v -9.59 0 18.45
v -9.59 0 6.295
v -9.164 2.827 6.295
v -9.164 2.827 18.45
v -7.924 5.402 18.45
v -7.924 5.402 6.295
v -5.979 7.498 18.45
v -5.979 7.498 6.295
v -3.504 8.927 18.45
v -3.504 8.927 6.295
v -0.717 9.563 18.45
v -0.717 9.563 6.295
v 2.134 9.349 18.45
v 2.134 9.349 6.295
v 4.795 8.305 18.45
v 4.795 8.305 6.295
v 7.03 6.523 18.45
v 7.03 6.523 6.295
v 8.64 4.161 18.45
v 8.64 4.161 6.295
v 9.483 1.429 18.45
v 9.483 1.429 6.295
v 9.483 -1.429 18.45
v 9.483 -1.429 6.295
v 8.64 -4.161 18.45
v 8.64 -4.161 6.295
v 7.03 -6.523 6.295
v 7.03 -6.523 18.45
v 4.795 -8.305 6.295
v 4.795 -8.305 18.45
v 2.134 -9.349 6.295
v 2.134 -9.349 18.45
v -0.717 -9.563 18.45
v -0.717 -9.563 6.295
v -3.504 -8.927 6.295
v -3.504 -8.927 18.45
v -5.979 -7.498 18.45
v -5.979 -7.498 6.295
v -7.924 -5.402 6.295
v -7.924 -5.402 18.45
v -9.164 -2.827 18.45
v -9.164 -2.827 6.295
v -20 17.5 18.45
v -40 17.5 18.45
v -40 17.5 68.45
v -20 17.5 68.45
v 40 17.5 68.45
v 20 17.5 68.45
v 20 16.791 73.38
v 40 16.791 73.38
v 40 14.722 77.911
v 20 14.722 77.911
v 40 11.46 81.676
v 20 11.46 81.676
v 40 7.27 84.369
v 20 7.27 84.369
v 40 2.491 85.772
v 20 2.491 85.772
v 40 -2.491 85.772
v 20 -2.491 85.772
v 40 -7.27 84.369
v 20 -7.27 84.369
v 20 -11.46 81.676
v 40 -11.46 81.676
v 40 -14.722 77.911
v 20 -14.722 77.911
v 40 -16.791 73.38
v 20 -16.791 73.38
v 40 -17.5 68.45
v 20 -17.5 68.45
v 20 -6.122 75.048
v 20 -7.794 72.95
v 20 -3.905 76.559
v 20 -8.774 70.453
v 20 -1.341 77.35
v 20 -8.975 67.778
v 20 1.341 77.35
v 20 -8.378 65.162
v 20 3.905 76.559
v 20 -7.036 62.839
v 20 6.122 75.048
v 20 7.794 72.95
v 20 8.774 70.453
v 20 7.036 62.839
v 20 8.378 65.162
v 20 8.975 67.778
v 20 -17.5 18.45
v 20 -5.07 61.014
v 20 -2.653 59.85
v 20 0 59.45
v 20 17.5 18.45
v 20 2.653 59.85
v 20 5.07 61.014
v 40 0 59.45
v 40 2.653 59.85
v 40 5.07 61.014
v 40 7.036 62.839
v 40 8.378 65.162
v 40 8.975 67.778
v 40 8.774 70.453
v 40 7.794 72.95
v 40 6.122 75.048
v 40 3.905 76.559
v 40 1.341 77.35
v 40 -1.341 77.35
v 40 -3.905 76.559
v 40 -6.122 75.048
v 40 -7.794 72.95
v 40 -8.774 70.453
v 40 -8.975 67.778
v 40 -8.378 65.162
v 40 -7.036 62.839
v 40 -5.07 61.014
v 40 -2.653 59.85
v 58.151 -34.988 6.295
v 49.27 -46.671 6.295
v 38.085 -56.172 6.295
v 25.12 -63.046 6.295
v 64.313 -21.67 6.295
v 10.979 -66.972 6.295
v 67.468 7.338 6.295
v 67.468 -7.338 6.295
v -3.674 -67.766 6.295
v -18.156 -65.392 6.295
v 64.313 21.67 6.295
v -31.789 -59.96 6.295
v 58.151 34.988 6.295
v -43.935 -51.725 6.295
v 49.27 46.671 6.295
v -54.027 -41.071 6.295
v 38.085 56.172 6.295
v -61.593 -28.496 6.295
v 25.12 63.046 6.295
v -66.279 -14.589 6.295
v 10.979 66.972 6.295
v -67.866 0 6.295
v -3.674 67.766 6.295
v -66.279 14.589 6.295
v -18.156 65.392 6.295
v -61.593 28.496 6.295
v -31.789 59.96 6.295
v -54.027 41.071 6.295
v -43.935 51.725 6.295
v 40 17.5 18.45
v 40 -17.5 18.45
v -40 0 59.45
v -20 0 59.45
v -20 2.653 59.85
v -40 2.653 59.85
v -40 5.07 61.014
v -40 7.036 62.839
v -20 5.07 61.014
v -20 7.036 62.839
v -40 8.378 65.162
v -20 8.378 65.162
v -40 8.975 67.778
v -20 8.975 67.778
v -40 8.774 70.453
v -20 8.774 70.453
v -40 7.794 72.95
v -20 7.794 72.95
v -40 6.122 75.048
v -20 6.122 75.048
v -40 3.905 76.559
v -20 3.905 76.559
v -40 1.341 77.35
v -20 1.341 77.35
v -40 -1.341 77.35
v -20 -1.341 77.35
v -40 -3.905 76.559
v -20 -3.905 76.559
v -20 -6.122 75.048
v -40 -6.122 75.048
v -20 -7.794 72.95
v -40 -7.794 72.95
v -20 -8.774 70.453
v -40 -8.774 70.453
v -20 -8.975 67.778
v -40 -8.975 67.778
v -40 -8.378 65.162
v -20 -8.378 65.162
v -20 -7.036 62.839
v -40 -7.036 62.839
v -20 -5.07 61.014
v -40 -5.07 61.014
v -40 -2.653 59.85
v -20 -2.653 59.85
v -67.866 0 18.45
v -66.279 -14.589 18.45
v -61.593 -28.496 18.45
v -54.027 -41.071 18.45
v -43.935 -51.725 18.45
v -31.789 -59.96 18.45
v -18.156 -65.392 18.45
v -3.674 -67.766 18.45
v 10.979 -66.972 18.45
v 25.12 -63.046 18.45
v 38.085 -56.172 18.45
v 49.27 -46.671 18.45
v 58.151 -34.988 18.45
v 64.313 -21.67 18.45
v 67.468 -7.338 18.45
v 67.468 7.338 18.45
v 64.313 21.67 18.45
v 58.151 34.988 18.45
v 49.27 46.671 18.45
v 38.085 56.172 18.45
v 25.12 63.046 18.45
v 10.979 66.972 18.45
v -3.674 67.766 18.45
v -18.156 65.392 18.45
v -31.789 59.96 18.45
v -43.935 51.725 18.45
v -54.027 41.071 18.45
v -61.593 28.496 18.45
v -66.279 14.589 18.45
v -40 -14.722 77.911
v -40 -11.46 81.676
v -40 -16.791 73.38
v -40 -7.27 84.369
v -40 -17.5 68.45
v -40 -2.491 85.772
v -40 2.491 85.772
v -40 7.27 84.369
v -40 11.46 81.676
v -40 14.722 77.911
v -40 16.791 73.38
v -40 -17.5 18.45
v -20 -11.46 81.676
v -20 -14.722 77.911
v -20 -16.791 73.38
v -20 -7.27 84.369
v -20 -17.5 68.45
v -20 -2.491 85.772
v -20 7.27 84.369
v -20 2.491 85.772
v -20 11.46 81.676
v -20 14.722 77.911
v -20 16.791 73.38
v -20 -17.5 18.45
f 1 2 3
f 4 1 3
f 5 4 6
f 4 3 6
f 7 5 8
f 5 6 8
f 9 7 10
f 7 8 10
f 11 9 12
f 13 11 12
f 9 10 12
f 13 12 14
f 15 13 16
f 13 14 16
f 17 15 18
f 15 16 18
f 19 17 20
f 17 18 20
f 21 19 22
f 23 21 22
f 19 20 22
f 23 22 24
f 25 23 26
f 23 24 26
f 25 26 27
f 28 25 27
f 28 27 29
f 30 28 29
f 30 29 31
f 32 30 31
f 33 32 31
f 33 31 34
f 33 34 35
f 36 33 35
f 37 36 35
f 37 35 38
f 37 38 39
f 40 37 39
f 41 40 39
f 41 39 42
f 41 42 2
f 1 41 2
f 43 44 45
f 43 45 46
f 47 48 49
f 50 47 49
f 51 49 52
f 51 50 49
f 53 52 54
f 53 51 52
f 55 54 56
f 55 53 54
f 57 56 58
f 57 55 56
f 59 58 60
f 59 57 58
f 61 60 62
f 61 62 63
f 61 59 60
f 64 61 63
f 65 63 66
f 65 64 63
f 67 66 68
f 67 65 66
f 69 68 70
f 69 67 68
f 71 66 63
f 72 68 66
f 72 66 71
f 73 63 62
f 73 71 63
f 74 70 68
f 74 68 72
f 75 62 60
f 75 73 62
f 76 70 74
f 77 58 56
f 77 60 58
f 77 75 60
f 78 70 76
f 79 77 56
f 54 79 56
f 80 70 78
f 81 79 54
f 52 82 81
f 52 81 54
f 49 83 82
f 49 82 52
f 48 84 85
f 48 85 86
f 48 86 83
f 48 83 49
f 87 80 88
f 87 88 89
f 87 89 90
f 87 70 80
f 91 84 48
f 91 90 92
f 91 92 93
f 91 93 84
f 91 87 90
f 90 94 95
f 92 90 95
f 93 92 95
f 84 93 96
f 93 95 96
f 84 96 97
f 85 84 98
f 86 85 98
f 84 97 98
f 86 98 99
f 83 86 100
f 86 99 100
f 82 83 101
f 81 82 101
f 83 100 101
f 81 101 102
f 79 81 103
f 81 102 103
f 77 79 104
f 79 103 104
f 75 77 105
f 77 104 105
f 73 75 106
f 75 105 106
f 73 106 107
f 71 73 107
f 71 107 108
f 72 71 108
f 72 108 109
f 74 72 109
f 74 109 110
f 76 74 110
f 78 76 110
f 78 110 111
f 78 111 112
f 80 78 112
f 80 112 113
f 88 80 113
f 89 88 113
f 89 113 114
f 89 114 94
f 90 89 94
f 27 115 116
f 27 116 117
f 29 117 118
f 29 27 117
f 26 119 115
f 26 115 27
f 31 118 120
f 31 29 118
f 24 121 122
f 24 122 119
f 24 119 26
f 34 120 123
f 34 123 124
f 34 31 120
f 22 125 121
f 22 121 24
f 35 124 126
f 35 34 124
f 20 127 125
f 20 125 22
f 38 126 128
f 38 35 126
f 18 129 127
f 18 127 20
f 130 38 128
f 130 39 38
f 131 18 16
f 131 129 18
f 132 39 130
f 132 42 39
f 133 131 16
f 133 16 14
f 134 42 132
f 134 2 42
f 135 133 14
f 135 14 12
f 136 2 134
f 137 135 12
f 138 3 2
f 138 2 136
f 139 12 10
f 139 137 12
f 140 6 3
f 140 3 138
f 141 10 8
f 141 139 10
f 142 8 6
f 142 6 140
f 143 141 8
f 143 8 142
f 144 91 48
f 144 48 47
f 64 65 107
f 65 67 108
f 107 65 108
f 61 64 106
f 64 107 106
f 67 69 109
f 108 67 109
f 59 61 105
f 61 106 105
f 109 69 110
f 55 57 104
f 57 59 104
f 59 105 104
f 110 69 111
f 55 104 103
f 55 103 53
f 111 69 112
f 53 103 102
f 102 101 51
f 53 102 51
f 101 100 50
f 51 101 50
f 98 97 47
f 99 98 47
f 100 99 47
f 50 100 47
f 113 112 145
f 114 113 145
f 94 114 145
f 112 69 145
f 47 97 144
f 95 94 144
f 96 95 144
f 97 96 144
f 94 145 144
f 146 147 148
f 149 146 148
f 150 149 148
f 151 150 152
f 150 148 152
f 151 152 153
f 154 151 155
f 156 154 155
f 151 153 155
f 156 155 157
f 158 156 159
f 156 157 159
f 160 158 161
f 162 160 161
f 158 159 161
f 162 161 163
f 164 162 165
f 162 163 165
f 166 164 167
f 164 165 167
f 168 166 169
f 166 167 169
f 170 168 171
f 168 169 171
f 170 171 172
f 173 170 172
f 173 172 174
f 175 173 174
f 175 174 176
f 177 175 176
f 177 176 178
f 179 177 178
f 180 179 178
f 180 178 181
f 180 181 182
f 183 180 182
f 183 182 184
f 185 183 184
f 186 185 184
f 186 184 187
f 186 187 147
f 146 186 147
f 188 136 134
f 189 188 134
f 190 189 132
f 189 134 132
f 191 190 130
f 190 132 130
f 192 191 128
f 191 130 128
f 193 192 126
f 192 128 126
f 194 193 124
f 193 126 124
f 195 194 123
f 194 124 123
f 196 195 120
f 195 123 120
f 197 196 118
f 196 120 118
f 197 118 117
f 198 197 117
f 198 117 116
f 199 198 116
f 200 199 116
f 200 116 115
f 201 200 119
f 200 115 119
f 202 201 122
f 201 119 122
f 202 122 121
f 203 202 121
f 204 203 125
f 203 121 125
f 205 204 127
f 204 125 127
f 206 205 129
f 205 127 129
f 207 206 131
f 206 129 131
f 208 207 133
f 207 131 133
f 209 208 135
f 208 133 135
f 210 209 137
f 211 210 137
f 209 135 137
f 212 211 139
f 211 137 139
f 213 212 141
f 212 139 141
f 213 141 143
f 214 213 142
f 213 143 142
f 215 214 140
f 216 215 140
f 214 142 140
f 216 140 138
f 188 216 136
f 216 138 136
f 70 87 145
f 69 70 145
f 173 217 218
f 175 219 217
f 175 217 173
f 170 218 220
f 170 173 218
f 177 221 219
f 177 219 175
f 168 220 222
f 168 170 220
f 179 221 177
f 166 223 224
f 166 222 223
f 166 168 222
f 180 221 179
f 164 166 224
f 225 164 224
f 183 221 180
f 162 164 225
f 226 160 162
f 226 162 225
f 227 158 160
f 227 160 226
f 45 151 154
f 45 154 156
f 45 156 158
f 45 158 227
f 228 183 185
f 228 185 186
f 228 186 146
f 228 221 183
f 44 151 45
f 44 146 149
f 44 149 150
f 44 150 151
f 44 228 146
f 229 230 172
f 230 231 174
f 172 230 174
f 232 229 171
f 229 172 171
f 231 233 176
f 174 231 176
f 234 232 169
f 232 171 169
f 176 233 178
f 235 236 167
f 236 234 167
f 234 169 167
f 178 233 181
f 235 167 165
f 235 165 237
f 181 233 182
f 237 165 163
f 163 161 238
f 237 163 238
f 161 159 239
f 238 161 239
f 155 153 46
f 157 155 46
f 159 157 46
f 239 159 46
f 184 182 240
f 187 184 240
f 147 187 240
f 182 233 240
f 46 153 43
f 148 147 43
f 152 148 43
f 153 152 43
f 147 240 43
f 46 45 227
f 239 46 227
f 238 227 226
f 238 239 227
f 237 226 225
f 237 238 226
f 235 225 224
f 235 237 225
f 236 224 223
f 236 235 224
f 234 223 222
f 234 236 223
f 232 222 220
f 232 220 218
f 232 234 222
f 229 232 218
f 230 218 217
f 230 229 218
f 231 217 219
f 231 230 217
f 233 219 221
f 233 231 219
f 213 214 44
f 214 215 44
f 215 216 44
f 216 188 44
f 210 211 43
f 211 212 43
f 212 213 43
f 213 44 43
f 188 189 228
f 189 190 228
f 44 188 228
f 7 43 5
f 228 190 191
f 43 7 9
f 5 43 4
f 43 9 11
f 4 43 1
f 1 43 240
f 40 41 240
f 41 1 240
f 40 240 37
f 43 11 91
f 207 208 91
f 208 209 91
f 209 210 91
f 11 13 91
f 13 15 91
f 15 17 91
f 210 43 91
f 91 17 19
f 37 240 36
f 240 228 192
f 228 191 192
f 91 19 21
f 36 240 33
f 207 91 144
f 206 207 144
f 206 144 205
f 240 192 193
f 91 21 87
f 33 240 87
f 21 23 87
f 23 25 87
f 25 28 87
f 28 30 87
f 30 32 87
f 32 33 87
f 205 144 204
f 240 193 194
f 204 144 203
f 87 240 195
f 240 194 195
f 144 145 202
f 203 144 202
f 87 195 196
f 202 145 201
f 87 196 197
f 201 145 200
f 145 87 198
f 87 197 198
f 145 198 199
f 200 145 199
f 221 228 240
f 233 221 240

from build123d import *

# Parameters (mm, degrees)
SKETCH5_R            = 9.589935832
CUT_EXTRUDE1_DEPTH   = 40
BOSS_EXTRUDE8_DEPTH  = 60
CIRPATTERN8_COUNT    = 24
SKETCH18_W           = 20
SKETCH18_H           = 35
BOSS_EXTRUDE9_DEPTH  = 50
SKETCH19_R           = 17.5
BOSS_EXTRUDE10_DEPTH = 20
SKETCH20_R           = 17.5
BOSS_EXTRUDE11_DEPTH = 20
SKETCH22_R           = 70
CUT_EXTRUDE3_DEPTH   = 65
SKETCH23_R           = 9
CUT_EXTRUDE4_DEPTH   = 90


with BuildPart() as part:
    # Sketch4 → Revolve1 (revolve)
    with BuildSketch(Plane(origin=(0, 0, 0), x_dir=(1, 0, 0), z_dir=(0, 1, 0))):
        Polygon((0, 0), (0, -18.450154162), (67.865602024, -18.450154162), (67.865602024, 58.705035971), (49.02838169, 58.705035971), (49.02838169, 0), align=None)
    revolve(axis=Axis((0, 0, -85.541623844), (0, 0, 1)))

    # Sketch5 → Cut-Extrude1 (cut)
    with BuildSketch(Plane(origin=(0, 0, 0), x_dir=(-1, 0, 0), z_dir=(0, 0, -1))):
        Circle(SKETCH5_R)
    extrude(amount=-CUT_EXTRUDE1_DEPTH, mode=Mode.SUBTRACT)

    # Sketch18 → Boss-Extrude9 (add)
    with BuildSketch(Plane.XY.offset(18.450154162)):
        with Locations((-30, 0)):
            Rectangle(SKETCH18_W, SKETCH18_H)
        with Locations((30, 0)):
            Rectangle(SKETCH18_W, SKETCH18_H)
    extrude(amount=BOSS_EXTRUDE9_DEPTH)

    # Sketch19 → Boss-Extrude10 (add)
    with BuildSketch(Plane(origin=(-20, 0, 0), x_dir=(0, 0, -1), z_dir=(1, 0, 0))):
        with Locations((-68.450154162, 0)):
            Circle(SKETCH19_R)
    extrude(amount=-BOSS_EXTRUDE10_DEPTH)

    # Sketch20 → Boss-Extrude11 (add)
    with BuildSketch(Plane(origin=(40, 0, 0), x_dir=(0, 0, -1), z_dir=(1, 0, 0))):
        with Locations((-68.450154162, 0)):
            Circle(SKETCH20_R)
    extrude(amount=-BOSS_EXTRUDE11_DEPTH)


with BuildPart() as body_2:
    # Sketch6 → Boss-Extrude8 (new body)
    with BuildSketch(Plane(origin=(0, 0, -58.705035971), x_dir=(-1, 0, 0), z_dir=(0, 0, -1))):
        Polygon((-8.362087214, 48.310016649), (-5.897089184, 44.631705328), (-3.61276171, 45.181148209), (-2.68200751, 48.954969583), align=None)
    extrude(amount=-BOSS_EXTRUDE8_DEPTH)


with BuildPart() as cirpattern8_1:
    # CirPattern8: pattern copy
    add(body_2.part.rotate(Axis((0, 0, 18.450154162), (0, 0, -1)), 1 * 360 / CIRPATTERN8_COUNT))


with BuildPart() as cirpattern8_2:
    # CirPattern8: pattern copy
    add(body_2.part.rotate(Axis((0, 0, 18.450154162), (0, 0, -1)), 2 * 360 / CIRPATTERN8_COUNT))


with BuildPart() as cirpattern8_3:
    # CirPattern8: pattern copy
    add(body_2.part.rotate(Axis((0, 0, 18.450154162), (0, 0, -1)), 3 * 360 / CIRPATTERN8_COUNT))


with BuildPart() as cirpattern8_4:
    # CirPattern8: pattern copy
    add(body_2.part.rotate(Axis((0, 0, 18.450154162), (0, 0, -1)), 4 * 360 / CIRPATTERN8_COUNT))


with BuildPart() as cirpattern8_5:
    # CirPattern8: pattern copy
    add(body_2.part.rotate(Axis((0, 0, 18.450154162), (0, 0, -1)), 5 * 360 / CIRPATTERN8_COUNT))


with BuildPart() as cirpattern8_6:
    # CirPattern8: pattern copy
    add(body_2.part.rotate(Axis((0, 0, 18.450154162), (0, 0, -1)), 6 * 360 / CIRPATTERN8_COUNT))


with BuildPart() as cirpattern8_7:
    # CirPattern8: pattern copy
    add(body_2.part.rotate(Axis((0, 0, 18.450154162), (0, 0, -1)), 7 * 360 / CIRPATTERN8_COUNT))


with BuildPart() as cirpattern8_8:
    # CirPattern8: pattern copy
    add(body_2.part.rotate(Axis((0, 0, 18.450154162), (0, 0, -1)), 8 * 360 / CIRPATTERN8_COUNT))


with BuildPart() as cirpattern8_9:
    # CirPattern8: pattern copy
    add(body_2.part.rotate(Axis((0, 0, 18.450154162), (0, 0, -1)), 9 * 360 / CIRPATTERN8_COUNT))


with BuildPart() as cirpattern8_10:
    # CirPattern8: pattern copy
    add(body_2.part.rotate(Axis((0, 0, 18.450154162), (0, 0, -1)), 10 * 360 / CIRPATTERN8_COUNT))


with BuildPart() as cirpattern8_11:
    # CirPattern8: pattern copy
    add(body_2.part.rotate(Axis((0, 0, 18.450154162), (0, 0, -1)), 11 * 360 / CIRPATTERN8_COUNT))


with BuildPart() as cirpattern8_12:
    # CirPattern8: pattern copy
    add(body_2.part.rotate(Axis((0, 0, 18.450154162), (0, 0, -1)), 12 * 360 / CIRPATTERN8_COUNT))


with BuildPart() as cirpattern8_13:
    # CirPattern8: pattern copy
    add(body_2.part.rotate(Axis((0, 0, 18.450154162), (0, 0, -1)), 13 * 360 / CIRPATTERN8_COUNT))


with BuildPart() as cirpattern8_14:
    # CirPattern8: pattern copy
    add(body_2.part.rotate(Axis((0, 0, 18.450154162), (0, 0, -1)), 14 * 360 / CIRPATTERN8_COUNT))


with BuildPart() as cirpattern8_15:
    # CirPattern8: pattern copy
    add(body_2.part.rotate(Axis((0, 0, 18.450154162), (0, 0, -1)), 15 * 360 / CIRPATTERN8_COUNT))


with BuildPart() as cirpattern8_16:
    # CirPattern8: pattern copy
    add(body_2.part.rotate(Axis((0, 0, 18.450154162), (0, 0, -1)), 16 * 360 / CIRPATTERN8_COUNT))


with BuildPart() as cirpattern8_17:
    # CirPattern8: pattern copy
    add(body_2.part.rotate(Axis((0, 0, 18.450154162), (0, 0, -1)), 17 * 360 / CIRPATTERN8_COUNT))


with BuildPart() as cirpattern8_18:
    # CirPattern8: pattern copy
    add(body_2.part.rotate(Axis((0, 0, 18.450154162), (0, 0, -1)), 18 * 360 / CIRPATTERN8_COUNT))


with BuildPart() as cirpattern8_19:
    # CirPattern8: pattern copy
    add(body_2.part.rotate(Axis((0, 0, 18.450154162), (0, 0, -1)), 19 * 360 / CIRPATTERN8_COUNT))


with BuildPart() as cirpattern8_20:
    # CirPattern8: pattern copy
    add(body_2.part.rotate(Axis((0, 0, 18.450154162), (0, 0, -1)), 20 * 360 / CIRPATTERN8_COUNT))


with BuildPart() as cirpattern8_21:
    # CirPattern8: pattern copy
    add(body_2.part.rotate(Axis((0, 0, 18.450154162), (0, 0, -1)), 21 * 360 / CIRPATTERN8_COUNT))


with BuildPart() as cirpattern8_22:
    # CirPattern8: pattern copy
    add(body_2.part.rotate(Axis((0, 0, 18.450154162), (0, 0, -1)), 22 * 360 / CIRPATTERN8_COUNT))


with BuildPart() as cirpattern8_23:
    # CirPattern8: pattern copy
    add(body_2.part.rotate(Axis((0, 0, 18.450154162), (0, 0, -1)), 23 * 360 / CIRPATTERN8_COUNT))


with BuildPart() as cut_extrude3_tool:
    # Sketch22 → Cut-Extrude3 (new body)
    with BuildSketch(Plane(origin=(0, 0, -58.705035971), x_dir=(-1, 0, 0), z_dir=(0, 0, -1))):
        Circle(SKETCH22_R)
    extrude(amount=-CUT_EXTRUDE3_DEPTH)


with BuildPart() as part_1:
    add(part.part)

    # Cut-Extrude3: cut by cut_extrude3_tool
    add(cut_extrude3_tool.part, mode=Mode.SUBTRACT)

    # Sketch23 → Cut-Extrude4 (cut)
    with BuildSketch(Plane(origin=(40, 0, 0), x_dir=(0, 0, -1), z_dir=(1, 0, 0))):
        with Locations((-68.450154162, 0)):
            Circle(SKETCH23_R)
    extrude(amount=-CUT_EXTRUDE4_DEPTH, mode=Mode.SUBTRACT)


with BuildPart() as body_2_1:
    add(body_2.part)

    # Cut-Extrude3: cut by cut_extrude3_tool
    add(cut_extrude3_tool.part, mode=Mode.SUBTRACT)


with BuildPart() as cirpattern8_1_1:
    add(cirpattern8_1.part)

    # Cut-Extrude3: cut by cut_extrude3_tool
    add(cut_extrude3_tool.part, mode=Mode.SUBTRACT)


with BuildPart() as cirpattern8_2_1:
    add(cirpattern8_2.part)

    # Cut-Extrude3: cut by cut_extrude3_tool
    add(cut_extrude3_tool.part, mode=Mode.SUBTRACT)


with BuildPart() as cirpattern8_3_1:
    add(cirpattern8_3.part)

    # Cut-Extrude3: cut by cut_extrude3_tool
    add(cut_extrude3_tool.part, mode=Mode.SUBTRACT)


with BuildPart() as cirpattern8_4_1:
    add(cirpattern8_4.part)

    # Cut-Extrude3: cut by cut_extrude3_tool
    add(cut_extrude3_tool.part, mode=Mode.SUBTRACT)


with BuildPart() as cirpattern8_5_1:
    add(cirpattern8_5.part)

    # Cut-Extrude3: cut by cut_extrude3_tool
    add(cut_extrude3_tool.part, mode=Mode.SUBTRACT)


with BuildPart() as cirpattern8_6_1:
    add(cirpattern8_6.part)

    # Cut-Extrude3: cut by cut_extrude3_tool
    add(cut_extrude3_tool.part, mode=Mode.SUBTRACT)


with BuildPart() as cirpattern8_7_1:
    add(cirpattern8_7.part)

    # Cut-Extrude3: cut by cut_extrude3_tool
    add(cut_extrude3_tool.part, mode=Mode.SUBTRACT)


with BuildPart() as cirpattern8_8_1:
    add(cirpattern8_8.part)

    # Cut-Extrude3: cut by cut_extrude3_tool
    add(cut_extrude3_tool.part, mode=Mode.SUBTRACT)


with BuildPart() as cirpattern8_9_1:
    add(cirpattern8_9.part)

    # Cut-Extrude3: cut by cut_extrude3_tool
    add(cut_extrude3_tool.part, mode=Mode.SUBTRACT)


with BuildPart() as cirpattern8_10_1:
    add(cirpattern8_10.part)

    # Cut-Extrude3: cut by cut_extrude3_tool
    add(cut_extrude3_tool.part, mode=Mode.SUBTRACT)


with BuildPart() as cirpattern8_11_1:
    add(cirpattern8_11.part)

    # Cut-Extrude3: cut by cut_extrude3_tool
    add(cut_extrude3_tool.part, mode=Mode.SUBTRACT)


with BuildPart() as cirpattern8_12_1:
    add(cirpattern8_12.part)

    # Cut-Extrude3: cut by cut_extrude3_tool
    add(cut_extrude3_tool.part, mode=Mode.SUBTRACT)


with BuildPart() as cirpattern8_13_1:
    add(cirpattern8_13.part)

    # Cut-Extrude3: cut by cut_extrude3_tool
    add(cut_extrude3_tool.part, mode=Mode.SUBTRACT)


with BuildPart() as cirpattern8_14_1:
    add(cirpattern8_14.part)

    # Cut-Extrude3: cut by cut_extrude3_tool
    add(cut_extrude3_tool.part, mode=Mode.SUBTRACT)


with BuildPart() as cirpattern8_15_1:
    add(cirpattern8_15.part)

    # Cut-Extrude3: cut by cut_extrude3_tool
    add(cut_extrude3_tool.part, mode=Mode.SUBTRACT)


with BuildPart() as cirpattern8_16_1:
    add(cirpattern8_16.part)

    # Cut-Extrude3: cut by cut_extrude3_tool
    add(cut_extrude3_tool.part, mode=Mode.SUBTRACT)


with BuildPart() as cirpattern8_17_1:
    add(cirpattern8_17.part)

    # Cut-Extrude3: cut by cut_extrude3_tool
    add(cut_extrude3_tool.part, mode=Mode.SUBTRACT)


with BuildPart() as cirpattern8_18_1:
    add(cirpattern8_18.part)

    # Cut-Extrude3: cut by cut_extrude3_tool
    add(cut_extrude3_tool.part, mode=Mode.SUBTRACT)


with BuildPart() as cirpattern8_19_1:
    add(cirpattern8_19.part)

    # Cut-Extrude3: cut by cut_extrude3_tool
    add(cut_extrude3_tool.part, mode=Mode.SUBTRACT)


with BuildPart() as cirpattern8_20_1:
    add(cirpattern8_20.part)

    # Cut-Extrude3: cut by cut_extrude3_tool
    add(cut_extrude3_tool.part, mode=Mode.SUBTRACT)


with BuildPart() as cirpattern8_21_1:
    add(cirpattern8_21.part)

    # Cut-Extrude3: cut by cut_extrude3_tool
    add(cut_extrude3_tool.part, mode=Mode.SUBTRACT)


with BuildPart() as cirpattern8_22_1:
    add(cirpattern8_22.part)

    # Cut-Extrude3: cut by cut_extrude3_tool
    add(cut_extrude3_tool.part, mode=Mode.SUBTRACT)


with BuildPart() as cirpattern8_23_1:
    add(cirpattern8_23.part)

    # Cut-Extrude3: cut by cut_extrude3_tool
    add(cut_extrude3_tool.part, mode=Mode.SUBTRACT)


solid = part_1.part
